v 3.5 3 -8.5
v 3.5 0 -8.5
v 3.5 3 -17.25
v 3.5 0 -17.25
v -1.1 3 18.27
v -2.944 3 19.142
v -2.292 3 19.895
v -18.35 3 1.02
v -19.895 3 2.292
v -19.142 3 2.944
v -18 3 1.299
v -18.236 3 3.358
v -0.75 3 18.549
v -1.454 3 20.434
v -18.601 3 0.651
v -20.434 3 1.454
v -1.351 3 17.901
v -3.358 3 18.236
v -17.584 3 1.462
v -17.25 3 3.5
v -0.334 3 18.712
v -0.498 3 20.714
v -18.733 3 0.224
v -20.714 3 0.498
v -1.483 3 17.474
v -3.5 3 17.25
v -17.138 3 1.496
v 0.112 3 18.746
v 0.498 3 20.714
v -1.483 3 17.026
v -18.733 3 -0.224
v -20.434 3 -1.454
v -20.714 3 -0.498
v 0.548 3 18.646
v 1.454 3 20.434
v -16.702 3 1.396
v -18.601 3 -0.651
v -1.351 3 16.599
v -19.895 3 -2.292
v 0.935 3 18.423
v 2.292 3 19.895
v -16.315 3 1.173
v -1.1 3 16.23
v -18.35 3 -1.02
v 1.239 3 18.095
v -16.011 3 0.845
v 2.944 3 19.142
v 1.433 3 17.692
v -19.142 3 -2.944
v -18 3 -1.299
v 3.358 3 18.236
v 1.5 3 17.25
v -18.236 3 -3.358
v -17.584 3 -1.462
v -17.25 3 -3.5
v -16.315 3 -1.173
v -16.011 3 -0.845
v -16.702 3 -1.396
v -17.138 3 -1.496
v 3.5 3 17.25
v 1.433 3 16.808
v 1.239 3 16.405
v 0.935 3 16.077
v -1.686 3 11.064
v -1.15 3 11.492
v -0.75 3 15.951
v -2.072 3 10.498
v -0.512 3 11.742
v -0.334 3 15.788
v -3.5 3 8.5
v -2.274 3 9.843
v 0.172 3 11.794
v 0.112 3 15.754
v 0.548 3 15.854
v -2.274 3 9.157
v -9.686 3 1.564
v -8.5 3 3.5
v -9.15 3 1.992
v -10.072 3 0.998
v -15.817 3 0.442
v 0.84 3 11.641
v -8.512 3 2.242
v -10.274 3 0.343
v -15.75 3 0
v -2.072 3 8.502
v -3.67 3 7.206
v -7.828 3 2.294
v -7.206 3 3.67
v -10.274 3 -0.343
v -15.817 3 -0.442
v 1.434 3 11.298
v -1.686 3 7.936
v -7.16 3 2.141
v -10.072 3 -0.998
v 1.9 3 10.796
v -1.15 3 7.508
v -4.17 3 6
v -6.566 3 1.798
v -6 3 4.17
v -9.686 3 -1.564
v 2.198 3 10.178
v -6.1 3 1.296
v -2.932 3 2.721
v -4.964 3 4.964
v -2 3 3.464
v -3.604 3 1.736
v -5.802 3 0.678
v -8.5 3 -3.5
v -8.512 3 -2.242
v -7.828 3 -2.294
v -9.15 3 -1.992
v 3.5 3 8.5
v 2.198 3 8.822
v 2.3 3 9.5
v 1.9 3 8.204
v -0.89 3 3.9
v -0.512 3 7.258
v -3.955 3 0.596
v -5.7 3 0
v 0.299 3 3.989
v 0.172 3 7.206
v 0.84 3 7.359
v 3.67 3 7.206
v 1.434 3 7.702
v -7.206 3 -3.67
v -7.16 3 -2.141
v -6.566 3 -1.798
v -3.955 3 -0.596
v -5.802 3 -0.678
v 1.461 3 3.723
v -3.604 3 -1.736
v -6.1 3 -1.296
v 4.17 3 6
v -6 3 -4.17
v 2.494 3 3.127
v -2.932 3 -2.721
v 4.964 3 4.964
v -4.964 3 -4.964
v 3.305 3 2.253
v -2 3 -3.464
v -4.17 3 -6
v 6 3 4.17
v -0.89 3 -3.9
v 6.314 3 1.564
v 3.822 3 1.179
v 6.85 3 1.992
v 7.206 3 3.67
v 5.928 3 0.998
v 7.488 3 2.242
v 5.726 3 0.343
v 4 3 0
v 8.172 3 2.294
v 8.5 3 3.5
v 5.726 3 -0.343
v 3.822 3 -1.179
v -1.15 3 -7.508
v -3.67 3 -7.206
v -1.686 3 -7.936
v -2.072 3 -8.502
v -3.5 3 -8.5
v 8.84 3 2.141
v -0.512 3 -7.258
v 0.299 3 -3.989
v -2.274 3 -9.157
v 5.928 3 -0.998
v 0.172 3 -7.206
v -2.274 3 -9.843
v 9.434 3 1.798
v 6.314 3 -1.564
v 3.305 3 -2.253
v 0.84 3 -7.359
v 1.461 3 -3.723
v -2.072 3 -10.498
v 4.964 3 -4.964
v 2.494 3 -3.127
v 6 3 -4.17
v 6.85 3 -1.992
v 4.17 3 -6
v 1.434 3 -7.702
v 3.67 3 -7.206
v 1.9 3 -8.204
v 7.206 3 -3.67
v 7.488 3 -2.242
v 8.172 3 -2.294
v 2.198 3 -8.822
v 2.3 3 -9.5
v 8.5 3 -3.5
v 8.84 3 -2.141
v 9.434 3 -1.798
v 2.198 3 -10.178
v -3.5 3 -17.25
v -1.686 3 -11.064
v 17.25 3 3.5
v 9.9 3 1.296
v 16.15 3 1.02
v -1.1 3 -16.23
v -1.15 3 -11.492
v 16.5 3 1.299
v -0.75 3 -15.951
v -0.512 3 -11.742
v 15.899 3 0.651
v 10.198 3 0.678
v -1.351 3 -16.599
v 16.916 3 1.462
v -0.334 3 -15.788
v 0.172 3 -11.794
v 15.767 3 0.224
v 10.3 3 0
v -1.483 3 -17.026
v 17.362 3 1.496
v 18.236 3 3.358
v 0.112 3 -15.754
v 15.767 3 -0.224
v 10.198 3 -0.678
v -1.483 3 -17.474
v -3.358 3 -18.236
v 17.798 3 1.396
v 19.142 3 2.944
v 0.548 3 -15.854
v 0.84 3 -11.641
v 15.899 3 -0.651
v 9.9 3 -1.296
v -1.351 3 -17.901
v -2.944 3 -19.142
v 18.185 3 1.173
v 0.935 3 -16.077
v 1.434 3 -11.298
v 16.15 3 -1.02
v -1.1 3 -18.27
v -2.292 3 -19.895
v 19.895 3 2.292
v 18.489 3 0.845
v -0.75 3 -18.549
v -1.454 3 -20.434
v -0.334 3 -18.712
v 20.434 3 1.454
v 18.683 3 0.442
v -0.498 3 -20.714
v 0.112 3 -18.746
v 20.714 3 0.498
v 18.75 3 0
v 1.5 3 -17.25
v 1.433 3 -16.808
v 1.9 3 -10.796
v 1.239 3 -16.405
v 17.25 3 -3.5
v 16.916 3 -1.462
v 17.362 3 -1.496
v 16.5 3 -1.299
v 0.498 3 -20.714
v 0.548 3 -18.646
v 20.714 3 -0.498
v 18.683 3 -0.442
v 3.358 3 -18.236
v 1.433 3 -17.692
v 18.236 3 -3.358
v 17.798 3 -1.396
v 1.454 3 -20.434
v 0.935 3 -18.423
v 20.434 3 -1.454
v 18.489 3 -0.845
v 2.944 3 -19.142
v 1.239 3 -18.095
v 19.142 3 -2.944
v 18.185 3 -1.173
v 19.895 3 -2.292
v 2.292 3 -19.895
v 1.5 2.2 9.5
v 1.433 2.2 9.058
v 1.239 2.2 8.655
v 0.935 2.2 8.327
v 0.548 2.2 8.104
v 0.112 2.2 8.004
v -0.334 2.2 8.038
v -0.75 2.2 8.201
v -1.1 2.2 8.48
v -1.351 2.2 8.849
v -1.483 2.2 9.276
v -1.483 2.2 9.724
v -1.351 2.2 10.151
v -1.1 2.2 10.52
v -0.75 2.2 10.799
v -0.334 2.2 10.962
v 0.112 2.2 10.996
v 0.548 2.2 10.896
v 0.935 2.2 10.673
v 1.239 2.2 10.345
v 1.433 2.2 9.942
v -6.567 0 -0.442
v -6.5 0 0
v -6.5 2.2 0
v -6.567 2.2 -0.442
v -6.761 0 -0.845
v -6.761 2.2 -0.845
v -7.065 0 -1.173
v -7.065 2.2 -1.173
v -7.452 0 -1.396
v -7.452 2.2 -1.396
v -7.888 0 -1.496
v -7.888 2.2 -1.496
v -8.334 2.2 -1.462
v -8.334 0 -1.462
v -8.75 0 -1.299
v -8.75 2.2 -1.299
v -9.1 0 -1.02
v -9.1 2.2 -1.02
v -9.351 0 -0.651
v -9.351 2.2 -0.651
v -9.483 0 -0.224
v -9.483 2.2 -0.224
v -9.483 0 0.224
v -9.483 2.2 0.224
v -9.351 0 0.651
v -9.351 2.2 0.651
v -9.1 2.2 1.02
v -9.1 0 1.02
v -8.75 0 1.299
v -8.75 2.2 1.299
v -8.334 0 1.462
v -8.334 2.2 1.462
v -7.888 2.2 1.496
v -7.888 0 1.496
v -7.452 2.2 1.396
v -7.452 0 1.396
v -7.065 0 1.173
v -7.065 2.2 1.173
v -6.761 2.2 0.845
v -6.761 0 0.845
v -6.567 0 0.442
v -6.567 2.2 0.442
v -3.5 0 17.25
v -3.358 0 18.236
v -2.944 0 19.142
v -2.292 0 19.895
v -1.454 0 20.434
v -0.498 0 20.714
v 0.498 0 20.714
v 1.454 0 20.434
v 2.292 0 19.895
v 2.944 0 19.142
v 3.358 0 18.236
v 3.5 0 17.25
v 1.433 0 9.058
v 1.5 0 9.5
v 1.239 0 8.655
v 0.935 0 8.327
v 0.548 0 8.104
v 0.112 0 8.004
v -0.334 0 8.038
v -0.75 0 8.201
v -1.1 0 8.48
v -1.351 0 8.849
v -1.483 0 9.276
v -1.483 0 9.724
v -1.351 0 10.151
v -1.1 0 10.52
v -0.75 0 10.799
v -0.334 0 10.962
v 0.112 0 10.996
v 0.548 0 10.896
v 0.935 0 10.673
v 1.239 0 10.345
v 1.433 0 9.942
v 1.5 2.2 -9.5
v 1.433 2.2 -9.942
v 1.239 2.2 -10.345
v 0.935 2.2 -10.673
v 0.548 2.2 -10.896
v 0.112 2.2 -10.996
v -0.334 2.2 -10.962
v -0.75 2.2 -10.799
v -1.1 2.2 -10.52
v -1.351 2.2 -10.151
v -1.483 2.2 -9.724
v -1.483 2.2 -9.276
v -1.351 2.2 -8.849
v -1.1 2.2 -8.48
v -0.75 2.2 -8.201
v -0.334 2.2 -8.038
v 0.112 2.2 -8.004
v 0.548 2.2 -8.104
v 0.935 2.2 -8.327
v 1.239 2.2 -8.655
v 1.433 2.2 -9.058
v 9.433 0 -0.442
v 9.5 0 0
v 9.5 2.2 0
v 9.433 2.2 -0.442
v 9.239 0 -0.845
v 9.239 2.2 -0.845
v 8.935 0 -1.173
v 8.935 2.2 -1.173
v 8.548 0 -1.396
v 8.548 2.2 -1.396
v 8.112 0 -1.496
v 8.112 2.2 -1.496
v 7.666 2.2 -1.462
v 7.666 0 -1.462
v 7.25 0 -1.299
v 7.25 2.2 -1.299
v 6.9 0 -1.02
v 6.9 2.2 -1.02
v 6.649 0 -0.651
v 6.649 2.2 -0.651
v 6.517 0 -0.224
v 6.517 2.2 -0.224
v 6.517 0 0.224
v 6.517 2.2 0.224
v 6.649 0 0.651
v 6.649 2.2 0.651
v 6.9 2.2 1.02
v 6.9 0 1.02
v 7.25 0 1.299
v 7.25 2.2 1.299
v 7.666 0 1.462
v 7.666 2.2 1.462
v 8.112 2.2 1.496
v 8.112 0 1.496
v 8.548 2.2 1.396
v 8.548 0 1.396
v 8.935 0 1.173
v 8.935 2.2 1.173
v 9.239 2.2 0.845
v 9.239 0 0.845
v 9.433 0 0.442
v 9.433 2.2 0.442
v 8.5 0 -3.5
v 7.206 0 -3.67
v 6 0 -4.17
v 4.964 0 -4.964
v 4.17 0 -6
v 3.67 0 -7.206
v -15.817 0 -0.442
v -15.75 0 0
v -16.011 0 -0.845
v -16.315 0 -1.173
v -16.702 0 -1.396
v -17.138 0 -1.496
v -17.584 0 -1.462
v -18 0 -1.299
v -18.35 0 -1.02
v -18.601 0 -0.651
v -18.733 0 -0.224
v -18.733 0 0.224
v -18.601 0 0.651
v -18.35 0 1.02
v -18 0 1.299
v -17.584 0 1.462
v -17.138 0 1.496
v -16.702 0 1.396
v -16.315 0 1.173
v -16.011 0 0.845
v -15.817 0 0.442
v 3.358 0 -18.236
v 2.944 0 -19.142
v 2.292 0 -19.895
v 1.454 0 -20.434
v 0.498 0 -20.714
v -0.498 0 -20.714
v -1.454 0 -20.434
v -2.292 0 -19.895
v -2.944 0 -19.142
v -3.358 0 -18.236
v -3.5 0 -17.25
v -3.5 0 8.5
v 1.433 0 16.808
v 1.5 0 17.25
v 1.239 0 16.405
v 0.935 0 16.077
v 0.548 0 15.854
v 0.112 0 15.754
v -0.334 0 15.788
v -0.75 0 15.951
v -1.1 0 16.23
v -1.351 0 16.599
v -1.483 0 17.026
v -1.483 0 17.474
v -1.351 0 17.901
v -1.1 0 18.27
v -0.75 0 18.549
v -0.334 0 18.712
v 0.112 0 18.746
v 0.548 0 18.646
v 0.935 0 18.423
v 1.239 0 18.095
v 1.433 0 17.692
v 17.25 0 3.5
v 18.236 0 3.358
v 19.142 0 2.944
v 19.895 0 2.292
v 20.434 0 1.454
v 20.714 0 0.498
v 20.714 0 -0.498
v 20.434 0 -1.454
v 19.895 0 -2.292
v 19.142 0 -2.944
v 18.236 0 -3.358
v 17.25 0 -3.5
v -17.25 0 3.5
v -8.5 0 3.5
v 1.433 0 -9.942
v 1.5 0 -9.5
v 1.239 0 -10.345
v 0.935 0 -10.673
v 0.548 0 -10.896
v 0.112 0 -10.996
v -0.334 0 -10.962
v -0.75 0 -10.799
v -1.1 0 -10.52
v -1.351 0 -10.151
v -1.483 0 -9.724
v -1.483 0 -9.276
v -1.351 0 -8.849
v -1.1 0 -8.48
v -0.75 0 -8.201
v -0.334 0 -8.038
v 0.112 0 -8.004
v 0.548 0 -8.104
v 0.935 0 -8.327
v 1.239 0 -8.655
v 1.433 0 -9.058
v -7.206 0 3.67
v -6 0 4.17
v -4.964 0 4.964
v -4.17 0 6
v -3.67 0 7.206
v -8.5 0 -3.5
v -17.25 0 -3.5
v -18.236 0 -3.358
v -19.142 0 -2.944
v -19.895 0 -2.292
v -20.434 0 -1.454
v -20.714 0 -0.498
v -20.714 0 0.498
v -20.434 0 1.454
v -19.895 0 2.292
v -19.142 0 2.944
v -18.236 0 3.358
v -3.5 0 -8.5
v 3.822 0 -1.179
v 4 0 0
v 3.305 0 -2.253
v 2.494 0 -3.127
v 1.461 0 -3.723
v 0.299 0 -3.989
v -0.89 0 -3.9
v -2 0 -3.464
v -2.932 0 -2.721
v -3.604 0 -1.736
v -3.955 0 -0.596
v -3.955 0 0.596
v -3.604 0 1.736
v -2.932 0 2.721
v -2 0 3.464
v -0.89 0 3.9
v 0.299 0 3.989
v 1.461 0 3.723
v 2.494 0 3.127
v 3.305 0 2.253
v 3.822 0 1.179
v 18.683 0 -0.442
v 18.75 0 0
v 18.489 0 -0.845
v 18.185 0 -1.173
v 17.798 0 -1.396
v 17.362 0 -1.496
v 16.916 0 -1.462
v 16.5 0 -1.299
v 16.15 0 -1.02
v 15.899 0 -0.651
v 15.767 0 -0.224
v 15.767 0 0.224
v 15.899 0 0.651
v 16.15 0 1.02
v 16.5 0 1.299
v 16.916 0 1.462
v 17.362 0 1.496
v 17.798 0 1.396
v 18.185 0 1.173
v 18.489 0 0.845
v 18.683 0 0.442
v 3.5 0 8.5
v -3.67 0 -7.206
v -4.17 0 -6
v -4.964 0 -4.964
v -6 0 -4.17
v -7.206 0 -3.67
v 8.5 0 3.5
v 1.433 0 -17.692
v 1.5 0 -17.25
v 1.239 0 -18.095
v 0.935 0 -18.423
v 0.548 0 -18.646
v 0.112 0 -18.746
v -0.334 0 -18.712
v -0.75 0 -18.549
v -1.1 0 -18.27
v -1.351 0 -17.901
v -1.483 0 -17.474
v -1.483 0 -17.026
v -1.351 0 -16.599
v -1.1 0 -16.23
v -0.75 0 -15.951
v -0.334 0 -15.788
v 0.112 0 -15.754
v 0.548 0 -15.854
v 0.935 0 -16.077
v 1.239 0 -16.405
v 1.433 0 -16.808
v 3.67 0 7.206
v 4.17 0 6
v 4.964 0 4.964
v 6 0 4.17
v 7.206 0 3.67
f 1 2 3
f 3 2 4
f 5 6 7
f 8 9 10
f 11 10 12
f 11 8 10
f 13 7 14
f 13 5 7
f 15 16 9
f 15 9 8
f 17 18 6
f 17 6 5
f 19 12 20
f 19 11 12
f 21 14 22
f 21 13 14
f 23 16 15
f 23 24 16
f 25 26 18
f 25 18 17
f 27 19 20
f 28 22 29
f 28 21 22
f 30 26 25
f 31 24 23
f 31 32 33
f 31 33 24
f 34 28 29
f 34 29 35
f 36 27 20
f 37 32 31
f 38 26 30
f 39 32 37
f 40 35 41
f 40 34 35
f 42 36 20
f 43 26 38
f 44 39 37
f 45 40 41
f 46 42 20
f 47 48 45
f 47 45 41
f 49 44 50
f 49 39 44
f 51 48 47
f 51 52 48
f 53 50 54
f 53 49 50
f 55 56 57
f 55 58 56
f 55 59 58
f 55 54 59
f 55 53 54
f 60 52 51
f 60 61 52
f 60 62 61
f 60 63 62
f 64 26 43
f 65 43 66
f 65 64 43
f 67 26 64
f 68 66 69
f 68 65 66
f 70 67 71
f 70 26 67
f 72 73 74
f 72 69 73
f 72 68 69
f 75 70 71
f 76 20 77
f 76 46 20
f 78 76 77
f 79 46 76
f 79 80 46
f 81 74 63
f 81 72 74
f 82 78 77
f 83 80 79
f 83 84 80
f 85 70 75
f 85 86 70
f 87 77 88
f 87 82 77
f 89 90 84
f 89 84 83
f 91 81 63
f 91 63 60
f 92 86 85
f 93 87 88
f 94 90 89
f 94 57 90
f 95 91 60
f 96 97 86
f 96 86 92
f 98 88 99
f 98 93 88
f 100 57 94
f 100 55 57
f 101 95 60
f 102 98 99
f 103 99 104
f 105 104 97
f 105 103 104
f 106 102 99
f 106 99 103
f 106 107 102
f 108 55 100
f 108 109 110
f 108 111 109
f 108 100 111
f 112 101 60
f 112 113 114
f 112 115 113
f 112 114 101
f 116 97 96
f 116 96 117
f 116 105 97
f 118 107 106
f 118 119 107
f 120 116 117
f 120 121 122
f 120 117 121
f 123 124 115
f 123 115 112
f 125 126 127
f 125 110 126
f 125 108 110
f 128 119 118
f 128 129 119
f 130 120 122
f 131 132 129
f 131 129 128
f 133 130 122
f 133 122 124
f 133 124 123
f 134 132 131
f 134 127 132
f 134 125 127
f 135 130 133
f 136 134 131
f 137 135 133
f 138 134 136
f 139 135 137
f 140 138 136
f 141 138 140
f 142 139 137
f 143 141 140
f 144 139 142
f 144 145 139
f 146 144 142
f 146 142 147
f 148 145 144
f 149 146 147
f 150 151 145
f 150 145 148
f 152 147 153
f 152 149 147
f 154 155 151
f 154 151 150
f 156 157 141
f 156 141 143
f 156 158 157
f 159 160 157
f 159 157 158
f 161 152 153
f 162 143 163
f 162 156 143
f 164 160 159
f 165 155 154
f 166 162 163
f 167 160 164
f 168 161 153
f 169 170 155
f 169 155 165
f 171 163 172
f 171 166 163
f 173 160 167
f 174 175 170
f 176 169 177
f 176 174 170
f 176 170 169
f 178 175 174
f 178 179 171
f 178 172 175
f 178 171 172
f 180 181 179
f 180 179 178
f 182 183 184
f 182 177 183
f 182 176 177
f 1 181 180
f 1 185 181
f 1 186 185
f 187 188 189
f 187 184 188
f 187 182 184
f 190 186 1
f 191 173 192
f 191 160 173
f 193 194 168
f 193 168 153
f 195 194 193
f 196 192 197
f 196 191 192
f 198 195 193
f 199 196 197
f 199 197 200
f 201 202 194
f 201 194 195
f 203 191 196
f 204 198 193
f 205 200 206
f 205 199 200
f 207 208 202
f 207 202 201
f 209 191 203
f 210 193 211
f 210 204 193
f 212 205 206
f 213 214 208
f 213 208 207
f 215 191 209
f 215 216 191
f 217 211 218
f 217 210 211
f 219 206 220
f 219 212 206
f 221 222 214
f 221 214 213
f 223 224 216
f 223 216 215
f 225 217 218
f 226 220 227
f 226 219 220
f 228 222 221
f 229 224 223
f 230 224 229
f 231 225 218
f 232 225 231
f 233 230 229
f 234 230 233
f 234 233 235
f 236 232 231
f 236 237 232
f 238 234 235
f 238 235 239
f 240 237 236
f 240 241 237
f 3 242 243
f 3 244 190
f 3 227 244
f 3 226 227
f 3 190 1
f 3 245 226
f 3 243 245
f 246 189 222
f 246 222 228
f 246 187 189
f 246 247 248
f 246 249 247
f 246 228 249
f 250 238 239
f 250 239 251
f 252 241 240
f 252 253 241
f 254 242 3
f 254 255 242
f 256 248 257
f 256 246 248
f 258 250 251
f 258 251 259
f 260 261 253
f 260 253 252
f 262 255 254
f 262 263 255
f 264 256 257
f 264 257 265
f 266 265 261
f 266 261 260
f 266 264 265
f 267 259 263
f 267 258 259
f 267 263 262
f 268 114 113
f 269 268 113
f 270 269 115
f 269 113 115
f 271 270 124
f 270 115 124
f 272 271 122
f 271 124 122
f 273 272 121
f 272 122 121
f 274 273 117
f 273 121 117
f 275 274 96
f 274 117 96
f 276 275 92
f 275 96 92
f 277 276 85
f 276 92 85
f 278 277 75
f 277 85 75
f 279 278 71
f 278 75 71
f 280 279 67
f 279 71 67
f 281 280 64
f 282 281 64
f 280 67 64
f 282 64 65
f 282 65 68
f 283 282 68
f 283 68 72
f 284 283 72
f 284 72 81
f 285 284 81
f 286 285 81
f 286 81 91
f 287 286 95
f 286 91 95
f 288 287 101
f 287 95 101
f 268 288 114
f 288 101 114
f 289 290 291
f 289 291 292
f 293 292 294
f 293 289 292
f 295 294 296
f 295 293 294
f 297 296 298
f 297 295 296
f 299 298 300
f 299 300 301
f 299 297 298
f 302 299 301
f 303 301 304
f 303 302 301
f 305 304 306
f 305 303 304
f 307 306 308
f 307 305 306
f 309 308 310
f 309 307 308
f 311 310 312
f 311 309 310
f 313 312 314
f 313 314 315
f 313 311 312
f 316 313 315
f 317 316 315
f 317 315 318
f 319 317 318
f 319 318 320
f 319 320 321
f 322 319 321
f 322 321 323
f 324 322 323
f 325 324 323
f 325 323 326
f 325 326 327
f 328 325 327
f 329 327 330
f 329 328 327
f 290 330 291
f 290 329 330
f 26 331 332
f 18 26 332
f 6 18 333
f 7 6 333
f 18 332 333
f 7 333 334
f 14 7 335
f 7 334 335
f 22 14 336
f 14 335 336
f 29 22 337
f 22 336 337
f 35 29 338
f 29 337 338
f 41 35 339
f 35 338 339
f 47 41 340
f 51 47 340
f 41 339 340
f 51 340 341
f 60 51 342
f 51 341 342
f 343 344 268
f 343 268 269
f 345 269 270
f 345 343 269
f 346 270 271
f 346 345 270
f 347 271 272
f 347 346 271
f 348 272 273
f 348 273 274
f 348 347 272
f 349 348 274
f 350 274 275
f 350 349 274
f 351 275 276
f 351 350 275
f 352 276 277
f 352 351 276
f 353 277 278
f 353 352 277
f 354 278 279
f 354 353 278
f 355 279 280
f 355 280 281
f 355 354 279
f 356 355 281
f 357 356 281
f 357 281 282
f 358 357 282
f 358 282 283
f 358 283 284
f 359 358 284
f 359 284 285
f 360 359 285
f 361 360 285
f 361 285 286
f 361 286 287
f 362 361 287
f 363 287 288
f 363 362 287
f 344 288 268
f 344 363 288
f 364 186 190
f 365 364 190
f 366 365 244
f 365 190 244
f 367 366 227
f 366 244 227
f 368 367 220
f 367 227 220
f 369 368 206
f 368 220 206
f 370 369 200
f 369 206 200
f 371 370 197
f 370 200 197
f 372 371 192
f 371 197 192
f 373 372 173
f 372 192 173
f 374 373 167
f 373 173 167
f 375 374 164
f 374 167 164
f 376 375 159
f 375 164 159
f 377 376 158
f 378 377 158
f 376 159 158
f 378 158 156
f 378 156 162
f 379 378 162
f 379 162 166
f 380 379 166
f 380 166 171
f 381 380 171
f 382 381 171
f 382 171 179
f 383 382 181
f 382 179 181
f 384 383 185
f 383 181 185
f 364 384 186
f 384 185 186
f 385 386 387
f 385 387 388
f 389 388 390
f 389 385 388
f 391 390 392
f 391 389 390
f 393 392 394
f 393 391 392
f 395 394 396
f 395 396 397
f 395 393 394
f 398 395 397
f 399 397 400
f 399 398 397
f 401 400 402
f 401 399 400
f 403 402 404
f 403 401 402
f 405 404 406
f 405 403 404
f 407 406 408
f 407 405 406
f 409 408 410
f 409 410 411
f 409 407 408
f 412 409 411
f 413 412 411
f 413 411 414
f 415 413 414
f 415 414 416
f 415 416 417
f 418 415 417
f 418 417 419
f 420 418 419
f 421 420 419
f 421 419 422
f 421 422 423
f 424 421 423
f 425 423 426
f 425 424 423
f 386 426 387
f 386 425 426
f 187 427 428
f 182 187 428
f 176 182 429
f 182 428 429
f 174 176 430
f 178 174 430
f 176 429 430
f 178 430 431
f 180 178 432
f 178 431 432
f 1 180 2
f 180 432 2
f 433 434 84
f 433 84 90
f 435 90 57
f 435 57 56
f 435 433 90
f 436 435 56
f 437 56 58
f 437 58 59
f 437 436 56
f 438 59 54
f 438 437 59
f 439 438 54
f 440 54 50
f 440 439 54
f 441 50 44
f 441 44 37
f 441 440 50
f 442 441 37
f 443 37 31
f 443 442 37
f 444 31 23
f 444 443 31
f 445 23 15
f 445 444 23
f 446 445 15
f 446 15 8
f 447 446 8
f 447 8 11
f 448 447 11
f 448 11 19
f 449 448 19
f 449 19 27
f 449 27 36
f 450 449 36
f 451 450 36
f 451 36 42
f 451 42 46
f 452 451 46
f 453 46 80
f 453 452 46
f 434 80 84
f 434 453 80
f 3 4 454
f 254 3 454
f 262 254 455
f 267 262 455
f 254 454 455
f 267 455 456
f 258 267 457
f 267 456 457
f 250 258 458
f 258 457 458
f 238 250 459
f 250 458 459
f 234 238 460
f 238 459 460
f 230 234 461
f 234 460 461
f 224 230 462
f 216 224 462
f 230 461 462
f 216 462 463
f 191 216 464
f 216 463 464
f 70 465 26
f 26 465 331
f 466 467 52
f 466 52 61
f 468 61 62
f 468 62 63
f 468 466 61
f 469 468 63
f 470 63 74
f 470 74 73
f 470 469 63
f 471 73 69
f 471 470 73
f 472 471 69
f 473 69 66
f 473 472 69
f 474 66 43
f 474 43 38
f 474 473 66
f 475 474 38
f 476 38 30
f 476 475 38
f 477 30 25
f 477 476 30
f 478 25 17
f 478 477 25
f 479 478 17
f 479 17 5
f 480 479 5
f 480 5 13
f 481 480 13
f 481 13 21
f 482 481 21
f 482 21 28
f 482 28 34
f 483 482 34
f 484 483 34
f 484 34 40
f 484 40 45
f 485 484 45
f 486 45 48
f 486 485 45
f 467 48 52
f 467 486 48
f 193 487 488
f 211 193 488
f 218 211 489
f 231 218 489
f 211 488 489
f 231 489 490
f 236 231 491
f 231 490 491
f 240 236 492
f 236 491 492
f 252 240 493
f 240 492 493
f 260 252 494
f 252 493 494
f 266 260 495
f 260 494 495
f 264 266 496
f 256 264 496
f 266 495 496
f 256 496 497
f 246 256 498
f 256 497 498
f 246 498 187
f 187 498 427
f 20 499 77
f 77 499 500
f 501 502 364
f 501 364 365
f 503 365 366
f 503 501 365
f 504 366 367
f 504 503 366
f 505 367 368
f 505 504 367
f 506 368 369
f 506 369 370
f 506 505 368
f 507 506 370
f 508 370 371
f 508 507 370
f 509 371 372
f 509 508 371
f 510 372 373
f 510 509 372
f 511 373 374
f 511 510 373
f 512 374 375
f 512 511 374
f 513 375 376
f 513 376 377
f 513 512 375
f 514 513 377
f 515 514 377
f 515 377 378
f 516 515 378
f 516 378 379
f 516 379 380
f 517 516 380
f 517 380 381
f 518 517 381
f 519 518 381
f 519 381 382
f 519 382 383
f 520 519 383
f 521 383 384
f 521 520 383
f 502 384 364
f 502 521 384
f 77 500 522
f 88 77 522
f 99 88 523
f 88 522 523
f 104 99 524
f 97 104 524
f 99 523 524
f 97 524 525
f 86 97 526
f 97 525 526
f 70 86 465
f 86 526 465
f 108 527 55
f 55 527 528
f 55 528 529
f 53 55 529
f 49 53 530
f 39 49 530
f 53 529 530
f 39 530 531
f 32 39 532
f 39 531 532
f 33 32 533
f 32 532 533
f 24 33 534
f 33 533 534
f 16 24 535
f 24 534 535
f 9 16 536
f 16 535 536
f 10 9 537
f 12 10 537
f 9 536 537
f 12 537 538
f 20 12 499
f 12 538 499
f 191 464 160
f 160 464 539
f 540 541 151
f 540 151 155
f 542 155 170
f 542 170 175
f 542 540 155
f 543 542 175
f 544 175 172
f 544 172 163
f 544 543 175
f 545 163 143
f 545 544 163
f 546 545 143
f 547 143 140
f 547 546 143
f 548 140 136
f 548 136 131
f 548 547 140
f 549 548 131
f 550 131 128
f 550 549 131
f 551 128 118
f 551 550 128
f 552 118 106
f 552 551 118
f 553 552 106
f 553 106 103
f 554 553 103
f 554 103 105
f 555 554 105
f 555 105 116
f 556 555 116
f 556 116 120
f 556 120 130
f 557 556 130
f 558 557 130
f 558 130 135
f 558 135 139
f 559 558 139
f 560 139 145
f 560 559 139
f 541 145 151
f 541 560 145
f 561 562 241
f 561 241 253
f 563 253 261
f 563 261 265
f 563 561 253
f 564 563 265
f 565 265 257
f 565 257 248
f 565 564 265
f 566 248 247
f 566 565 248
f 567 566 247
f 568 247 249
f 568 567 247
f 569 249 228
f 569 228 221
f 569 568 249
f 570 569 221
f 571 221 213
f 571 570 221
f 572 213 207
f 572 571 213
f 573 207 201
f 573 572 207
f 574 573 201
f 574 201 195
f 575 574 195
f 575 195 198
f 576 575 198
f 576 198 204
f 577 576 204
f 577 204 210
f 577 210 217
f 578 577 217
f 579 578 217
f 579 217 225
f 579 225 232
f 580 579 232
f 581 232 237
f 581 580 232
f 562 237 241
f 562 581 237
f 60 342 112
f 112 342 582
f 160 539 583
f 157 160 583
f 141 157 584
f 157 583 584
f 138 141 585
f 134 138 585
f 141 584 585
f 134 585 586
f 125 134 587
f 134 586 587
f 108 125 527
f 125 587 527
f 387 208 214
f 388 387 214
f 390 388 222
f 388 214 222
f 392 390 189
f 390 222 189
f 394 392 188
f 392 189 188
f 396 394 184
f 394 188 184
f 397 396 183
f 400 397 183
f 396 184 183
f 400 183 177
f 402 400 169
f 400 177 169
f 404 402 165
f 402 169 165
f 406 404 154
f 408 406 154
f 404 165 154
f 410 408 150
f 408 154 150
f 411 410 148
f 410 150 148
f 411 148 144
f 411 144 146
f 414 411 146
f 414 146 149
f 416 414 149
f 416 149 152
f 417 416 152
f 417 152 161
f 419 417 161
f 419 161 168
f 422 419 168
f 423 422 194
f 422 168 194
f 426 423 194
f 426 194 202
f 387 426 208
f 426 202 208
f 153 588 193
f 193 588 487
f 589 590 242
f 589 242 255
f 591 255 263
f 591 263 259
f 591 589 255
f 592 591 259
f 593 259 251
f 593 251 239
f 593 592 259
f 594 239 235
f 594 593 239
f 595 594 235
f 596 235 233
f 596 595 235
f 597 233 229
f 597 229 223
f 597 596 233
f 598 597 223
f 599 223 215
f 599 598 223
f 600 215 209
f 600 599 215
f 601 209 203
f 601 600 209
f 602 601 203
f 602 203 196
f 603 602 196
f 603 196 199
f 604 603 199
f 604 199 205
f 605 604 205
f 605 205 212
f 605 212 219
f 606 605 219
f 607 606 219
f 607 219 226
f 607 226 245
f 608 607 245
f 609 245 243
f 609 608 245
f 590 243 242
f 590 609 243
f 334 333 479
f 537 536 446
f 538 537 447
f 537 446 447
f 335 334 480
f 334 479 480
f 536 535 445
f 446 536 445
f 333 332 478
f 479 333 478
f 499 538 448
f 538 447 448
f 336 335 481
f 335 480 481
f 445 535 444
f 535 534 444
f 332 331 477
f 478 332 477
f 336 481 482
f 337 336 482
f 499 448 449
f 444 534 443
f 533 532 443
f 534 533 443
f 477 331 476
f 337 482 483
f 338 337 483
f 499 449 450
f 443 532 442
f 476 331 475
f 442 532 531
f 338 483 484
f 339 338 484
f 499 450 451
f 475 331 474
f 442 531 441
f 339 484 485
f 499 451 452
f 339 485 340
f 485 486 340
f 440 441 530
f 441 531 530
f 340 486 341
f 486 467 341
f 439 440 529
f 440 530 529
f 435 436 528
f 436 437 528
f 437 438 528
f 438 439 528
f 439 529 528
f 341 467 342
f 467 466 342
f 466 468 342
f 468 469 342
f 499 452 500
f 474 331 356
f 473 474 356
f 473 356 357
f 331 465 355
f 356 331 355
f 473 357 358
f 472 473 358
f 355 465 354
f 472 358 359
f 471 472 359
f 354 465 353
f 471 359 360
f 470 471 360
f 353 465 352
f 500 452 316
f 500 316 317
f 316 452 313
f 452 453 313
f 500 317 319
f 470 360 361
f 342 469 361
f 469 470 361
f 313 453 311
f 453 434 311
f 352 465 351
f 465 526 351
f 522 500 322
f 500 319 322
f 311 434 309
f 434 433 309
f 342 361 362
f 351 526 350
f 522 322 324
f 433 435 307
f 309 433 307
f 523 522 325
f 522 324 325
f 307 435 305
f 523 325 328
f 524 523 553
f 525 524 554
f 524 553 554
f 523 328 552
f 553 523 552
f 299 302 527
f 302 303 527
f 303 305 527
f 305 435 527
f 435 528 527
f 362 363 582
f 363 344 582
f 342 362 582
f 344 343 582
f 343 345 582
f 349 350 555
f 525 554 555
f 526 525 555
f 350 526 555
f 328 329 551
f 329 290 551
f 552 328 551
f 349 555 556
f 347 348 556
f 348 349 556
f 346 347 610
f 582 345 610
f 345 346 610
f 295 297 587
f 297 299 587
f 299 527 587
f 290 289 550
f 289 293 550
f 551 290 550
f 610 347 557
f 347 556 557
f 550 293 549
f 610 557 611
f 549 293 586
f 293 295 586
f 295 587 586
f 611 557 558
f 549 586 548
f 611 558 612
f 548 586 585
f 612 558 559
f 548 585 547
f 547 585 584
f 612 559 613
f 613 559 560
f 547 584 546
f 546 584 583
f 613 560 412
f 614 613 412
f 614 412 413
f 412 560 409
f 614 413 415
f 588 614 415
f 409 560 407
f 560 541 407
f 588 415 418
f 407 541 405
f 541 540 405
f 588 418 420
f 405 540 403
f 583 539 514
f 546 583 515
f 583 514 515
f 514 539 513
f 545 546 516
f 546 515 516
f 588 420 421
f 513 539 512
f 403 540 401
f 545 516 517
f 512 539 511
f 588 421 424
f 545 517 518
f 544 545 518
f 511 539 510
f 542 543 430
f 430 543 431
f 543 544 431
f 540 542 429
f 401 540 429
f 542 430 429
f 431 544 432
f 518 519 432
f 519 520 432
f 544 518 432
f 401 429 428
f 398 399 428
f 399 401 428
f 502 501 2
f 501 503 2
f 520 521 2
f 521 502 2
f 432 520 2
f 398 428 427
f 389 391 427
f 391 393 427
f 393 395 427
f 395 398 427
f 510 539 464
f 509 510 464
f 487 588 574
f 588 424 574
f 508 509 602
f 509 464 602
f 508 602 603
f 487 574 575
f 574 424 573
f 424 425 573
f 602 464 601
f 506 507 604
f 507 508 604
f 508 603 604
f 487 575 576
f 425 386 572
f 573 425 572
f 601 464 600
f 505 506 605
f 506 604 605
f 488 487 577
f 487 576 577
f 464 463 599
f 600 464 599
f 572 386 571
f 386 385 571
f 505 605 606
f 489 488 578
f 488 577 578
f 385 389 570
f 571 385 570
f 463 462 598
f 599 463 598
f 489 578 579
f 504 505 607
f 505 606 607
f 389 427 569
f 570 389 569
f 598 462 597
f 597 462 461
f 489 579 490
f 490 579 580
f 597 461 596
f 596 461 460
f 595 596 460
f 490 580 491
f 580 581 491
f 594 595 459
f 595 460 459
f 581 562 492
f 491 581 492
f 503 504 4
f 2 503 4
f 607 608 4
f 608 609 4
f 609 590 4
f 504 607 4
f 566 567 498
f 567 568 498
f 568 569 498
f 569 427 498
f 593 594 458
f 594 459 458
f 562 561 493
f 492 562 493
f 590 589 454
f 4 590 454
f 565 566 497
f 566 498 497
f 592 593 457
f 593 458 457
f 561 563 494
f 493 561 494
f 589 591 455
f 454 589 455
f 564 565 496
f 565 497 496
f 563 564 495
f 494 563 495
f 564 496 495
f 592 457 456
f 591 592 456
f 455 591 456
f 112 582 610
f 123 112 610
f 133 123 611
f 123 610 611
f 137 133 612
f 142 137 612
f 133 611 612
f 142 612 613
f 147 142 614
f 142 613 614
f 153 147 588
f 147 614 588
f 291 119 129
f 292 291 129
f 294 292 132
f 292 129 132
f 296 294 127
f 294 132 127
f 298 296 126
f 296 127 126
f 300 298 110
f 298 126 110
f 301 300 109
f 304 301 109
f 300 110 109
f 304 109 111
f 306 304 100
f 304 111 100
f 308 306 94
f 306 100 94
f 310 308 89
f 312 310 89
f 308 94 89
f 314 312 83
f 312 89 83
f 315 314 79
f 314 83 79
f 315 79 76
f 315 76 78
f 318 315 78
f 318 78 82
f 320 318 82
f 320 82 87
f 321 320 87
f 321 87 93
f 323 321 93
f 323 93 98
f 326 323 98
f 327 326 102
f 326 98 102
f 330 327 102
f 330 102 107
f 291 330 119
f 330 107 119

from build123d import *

# Parameters (mm, degrees)
SKETCH1_R           = 4
SKETCH1_R_2         = 1.5
BOSS_EXTRUDE1_DEPTH = 3
CHAMFER1_SIZE       = 0.8


with BuildPart() as part:
    # Sketch1 → Boss-Extrude1 (new body)
    with BuildSketch(Plane(origin=(0, 0, 0), x_dir=(1, 0, 0), z_dir=(0, 1, 0))):
        with BuildLine():
            Line((-3.5, 17.25), (-3.5, 8.5))
            ThreePointArc((-3.5, 8.5), (-4.964466094, 4.964466094), (-8.5, 3.5))
            Line((-8.5, 3.5), (-17.25, 3.5))
            ThreePointArc((-17.25, 3.5), (-20.75, 0), (-17.25, -3.5))
            Line((-17.25, -3.5), (-8.5, -3.5))
            ThreePointArc((-8.5, -3.5), (-4.964466094, -4.964466094), (-3.5, -8.5))
            Line((-3.5, -8.5), (-3.5, -17.25))
            ThreePointArc((-3.5, -17.25), (0, -20.75), (3.5, -17.25))
            Line((3.5, -17.25), (3.5, -8.5))
            ThreePointArc((3.5, -8.5), (4.964466094, -4.964466094), (8.5, -3.5))
            Line((8.5, -3.5), (17.25, -3.5))
            ThreePointArc((17.25, -3.5), (20.75, 0), (17.25, 3.5))
            Line((17.25, 3.5), (8.5, 3.5))
            ThreePointArc((8.5, 3.5), (4.964466094, 4.964466094), (3.5, 8.5))
            Line((3.5, 8.5), (3.5, 17.25))
            ThreePointArc((3.5, 17.25), (0, 20.75), (-3.5, 17.25))
        make_face()
        Circle(SKETCH1_R, mode=Mode.SUBTRACT)
        with Locations((0, 17.25)):
            Circle(SKETCH1_R_2, mode=Mode.SUBTRACT)
        with Locations((17.25, 0)):
            Circle(SKETCH1_R_2, mode=Mode.SUBTRACT)
        with Locations((0, -17.25)):
            Circle(SKETCH1_R_2, mode=Mode.SUBTRACT)
        with Locations((-17.25, 0)):
            Circle(SKETCH1_R_2, mode=Mode.SUBTRACT)
        with Locations((-8, 0)):
            Circle(SKETCH1_R_2, mode=Mode.SUBTRACT)
        with Locations((8, 0)):
            Circle(SKETCH1_R_2, mode=Mode.SUBTRACT)
        with Locations((0, 9.5)):
            Circle(SKETCH1_R_2, mode=Mode.SUBTRACT)
        with Locations((0, -9.5)):
            Circle(SKETCH1_R_2, mode=Mode.SUBTRACT)
    extrude(amount=BOSS_EXTRUDE1_DEPTH)

    # Chamfer1
    chamfer1_edges = [part.edges().sort_by_distance(p)[0] for p in [
        (-9.5, 3, 0),
        (6.5, 3, 0),
        (-1.5, 3, -9.5),
        (-1.5, 3, 9.5),
    ]]
    chamfer(chamfer1_edges, length=CHAMFER1_SIZE)


solid = part.part
